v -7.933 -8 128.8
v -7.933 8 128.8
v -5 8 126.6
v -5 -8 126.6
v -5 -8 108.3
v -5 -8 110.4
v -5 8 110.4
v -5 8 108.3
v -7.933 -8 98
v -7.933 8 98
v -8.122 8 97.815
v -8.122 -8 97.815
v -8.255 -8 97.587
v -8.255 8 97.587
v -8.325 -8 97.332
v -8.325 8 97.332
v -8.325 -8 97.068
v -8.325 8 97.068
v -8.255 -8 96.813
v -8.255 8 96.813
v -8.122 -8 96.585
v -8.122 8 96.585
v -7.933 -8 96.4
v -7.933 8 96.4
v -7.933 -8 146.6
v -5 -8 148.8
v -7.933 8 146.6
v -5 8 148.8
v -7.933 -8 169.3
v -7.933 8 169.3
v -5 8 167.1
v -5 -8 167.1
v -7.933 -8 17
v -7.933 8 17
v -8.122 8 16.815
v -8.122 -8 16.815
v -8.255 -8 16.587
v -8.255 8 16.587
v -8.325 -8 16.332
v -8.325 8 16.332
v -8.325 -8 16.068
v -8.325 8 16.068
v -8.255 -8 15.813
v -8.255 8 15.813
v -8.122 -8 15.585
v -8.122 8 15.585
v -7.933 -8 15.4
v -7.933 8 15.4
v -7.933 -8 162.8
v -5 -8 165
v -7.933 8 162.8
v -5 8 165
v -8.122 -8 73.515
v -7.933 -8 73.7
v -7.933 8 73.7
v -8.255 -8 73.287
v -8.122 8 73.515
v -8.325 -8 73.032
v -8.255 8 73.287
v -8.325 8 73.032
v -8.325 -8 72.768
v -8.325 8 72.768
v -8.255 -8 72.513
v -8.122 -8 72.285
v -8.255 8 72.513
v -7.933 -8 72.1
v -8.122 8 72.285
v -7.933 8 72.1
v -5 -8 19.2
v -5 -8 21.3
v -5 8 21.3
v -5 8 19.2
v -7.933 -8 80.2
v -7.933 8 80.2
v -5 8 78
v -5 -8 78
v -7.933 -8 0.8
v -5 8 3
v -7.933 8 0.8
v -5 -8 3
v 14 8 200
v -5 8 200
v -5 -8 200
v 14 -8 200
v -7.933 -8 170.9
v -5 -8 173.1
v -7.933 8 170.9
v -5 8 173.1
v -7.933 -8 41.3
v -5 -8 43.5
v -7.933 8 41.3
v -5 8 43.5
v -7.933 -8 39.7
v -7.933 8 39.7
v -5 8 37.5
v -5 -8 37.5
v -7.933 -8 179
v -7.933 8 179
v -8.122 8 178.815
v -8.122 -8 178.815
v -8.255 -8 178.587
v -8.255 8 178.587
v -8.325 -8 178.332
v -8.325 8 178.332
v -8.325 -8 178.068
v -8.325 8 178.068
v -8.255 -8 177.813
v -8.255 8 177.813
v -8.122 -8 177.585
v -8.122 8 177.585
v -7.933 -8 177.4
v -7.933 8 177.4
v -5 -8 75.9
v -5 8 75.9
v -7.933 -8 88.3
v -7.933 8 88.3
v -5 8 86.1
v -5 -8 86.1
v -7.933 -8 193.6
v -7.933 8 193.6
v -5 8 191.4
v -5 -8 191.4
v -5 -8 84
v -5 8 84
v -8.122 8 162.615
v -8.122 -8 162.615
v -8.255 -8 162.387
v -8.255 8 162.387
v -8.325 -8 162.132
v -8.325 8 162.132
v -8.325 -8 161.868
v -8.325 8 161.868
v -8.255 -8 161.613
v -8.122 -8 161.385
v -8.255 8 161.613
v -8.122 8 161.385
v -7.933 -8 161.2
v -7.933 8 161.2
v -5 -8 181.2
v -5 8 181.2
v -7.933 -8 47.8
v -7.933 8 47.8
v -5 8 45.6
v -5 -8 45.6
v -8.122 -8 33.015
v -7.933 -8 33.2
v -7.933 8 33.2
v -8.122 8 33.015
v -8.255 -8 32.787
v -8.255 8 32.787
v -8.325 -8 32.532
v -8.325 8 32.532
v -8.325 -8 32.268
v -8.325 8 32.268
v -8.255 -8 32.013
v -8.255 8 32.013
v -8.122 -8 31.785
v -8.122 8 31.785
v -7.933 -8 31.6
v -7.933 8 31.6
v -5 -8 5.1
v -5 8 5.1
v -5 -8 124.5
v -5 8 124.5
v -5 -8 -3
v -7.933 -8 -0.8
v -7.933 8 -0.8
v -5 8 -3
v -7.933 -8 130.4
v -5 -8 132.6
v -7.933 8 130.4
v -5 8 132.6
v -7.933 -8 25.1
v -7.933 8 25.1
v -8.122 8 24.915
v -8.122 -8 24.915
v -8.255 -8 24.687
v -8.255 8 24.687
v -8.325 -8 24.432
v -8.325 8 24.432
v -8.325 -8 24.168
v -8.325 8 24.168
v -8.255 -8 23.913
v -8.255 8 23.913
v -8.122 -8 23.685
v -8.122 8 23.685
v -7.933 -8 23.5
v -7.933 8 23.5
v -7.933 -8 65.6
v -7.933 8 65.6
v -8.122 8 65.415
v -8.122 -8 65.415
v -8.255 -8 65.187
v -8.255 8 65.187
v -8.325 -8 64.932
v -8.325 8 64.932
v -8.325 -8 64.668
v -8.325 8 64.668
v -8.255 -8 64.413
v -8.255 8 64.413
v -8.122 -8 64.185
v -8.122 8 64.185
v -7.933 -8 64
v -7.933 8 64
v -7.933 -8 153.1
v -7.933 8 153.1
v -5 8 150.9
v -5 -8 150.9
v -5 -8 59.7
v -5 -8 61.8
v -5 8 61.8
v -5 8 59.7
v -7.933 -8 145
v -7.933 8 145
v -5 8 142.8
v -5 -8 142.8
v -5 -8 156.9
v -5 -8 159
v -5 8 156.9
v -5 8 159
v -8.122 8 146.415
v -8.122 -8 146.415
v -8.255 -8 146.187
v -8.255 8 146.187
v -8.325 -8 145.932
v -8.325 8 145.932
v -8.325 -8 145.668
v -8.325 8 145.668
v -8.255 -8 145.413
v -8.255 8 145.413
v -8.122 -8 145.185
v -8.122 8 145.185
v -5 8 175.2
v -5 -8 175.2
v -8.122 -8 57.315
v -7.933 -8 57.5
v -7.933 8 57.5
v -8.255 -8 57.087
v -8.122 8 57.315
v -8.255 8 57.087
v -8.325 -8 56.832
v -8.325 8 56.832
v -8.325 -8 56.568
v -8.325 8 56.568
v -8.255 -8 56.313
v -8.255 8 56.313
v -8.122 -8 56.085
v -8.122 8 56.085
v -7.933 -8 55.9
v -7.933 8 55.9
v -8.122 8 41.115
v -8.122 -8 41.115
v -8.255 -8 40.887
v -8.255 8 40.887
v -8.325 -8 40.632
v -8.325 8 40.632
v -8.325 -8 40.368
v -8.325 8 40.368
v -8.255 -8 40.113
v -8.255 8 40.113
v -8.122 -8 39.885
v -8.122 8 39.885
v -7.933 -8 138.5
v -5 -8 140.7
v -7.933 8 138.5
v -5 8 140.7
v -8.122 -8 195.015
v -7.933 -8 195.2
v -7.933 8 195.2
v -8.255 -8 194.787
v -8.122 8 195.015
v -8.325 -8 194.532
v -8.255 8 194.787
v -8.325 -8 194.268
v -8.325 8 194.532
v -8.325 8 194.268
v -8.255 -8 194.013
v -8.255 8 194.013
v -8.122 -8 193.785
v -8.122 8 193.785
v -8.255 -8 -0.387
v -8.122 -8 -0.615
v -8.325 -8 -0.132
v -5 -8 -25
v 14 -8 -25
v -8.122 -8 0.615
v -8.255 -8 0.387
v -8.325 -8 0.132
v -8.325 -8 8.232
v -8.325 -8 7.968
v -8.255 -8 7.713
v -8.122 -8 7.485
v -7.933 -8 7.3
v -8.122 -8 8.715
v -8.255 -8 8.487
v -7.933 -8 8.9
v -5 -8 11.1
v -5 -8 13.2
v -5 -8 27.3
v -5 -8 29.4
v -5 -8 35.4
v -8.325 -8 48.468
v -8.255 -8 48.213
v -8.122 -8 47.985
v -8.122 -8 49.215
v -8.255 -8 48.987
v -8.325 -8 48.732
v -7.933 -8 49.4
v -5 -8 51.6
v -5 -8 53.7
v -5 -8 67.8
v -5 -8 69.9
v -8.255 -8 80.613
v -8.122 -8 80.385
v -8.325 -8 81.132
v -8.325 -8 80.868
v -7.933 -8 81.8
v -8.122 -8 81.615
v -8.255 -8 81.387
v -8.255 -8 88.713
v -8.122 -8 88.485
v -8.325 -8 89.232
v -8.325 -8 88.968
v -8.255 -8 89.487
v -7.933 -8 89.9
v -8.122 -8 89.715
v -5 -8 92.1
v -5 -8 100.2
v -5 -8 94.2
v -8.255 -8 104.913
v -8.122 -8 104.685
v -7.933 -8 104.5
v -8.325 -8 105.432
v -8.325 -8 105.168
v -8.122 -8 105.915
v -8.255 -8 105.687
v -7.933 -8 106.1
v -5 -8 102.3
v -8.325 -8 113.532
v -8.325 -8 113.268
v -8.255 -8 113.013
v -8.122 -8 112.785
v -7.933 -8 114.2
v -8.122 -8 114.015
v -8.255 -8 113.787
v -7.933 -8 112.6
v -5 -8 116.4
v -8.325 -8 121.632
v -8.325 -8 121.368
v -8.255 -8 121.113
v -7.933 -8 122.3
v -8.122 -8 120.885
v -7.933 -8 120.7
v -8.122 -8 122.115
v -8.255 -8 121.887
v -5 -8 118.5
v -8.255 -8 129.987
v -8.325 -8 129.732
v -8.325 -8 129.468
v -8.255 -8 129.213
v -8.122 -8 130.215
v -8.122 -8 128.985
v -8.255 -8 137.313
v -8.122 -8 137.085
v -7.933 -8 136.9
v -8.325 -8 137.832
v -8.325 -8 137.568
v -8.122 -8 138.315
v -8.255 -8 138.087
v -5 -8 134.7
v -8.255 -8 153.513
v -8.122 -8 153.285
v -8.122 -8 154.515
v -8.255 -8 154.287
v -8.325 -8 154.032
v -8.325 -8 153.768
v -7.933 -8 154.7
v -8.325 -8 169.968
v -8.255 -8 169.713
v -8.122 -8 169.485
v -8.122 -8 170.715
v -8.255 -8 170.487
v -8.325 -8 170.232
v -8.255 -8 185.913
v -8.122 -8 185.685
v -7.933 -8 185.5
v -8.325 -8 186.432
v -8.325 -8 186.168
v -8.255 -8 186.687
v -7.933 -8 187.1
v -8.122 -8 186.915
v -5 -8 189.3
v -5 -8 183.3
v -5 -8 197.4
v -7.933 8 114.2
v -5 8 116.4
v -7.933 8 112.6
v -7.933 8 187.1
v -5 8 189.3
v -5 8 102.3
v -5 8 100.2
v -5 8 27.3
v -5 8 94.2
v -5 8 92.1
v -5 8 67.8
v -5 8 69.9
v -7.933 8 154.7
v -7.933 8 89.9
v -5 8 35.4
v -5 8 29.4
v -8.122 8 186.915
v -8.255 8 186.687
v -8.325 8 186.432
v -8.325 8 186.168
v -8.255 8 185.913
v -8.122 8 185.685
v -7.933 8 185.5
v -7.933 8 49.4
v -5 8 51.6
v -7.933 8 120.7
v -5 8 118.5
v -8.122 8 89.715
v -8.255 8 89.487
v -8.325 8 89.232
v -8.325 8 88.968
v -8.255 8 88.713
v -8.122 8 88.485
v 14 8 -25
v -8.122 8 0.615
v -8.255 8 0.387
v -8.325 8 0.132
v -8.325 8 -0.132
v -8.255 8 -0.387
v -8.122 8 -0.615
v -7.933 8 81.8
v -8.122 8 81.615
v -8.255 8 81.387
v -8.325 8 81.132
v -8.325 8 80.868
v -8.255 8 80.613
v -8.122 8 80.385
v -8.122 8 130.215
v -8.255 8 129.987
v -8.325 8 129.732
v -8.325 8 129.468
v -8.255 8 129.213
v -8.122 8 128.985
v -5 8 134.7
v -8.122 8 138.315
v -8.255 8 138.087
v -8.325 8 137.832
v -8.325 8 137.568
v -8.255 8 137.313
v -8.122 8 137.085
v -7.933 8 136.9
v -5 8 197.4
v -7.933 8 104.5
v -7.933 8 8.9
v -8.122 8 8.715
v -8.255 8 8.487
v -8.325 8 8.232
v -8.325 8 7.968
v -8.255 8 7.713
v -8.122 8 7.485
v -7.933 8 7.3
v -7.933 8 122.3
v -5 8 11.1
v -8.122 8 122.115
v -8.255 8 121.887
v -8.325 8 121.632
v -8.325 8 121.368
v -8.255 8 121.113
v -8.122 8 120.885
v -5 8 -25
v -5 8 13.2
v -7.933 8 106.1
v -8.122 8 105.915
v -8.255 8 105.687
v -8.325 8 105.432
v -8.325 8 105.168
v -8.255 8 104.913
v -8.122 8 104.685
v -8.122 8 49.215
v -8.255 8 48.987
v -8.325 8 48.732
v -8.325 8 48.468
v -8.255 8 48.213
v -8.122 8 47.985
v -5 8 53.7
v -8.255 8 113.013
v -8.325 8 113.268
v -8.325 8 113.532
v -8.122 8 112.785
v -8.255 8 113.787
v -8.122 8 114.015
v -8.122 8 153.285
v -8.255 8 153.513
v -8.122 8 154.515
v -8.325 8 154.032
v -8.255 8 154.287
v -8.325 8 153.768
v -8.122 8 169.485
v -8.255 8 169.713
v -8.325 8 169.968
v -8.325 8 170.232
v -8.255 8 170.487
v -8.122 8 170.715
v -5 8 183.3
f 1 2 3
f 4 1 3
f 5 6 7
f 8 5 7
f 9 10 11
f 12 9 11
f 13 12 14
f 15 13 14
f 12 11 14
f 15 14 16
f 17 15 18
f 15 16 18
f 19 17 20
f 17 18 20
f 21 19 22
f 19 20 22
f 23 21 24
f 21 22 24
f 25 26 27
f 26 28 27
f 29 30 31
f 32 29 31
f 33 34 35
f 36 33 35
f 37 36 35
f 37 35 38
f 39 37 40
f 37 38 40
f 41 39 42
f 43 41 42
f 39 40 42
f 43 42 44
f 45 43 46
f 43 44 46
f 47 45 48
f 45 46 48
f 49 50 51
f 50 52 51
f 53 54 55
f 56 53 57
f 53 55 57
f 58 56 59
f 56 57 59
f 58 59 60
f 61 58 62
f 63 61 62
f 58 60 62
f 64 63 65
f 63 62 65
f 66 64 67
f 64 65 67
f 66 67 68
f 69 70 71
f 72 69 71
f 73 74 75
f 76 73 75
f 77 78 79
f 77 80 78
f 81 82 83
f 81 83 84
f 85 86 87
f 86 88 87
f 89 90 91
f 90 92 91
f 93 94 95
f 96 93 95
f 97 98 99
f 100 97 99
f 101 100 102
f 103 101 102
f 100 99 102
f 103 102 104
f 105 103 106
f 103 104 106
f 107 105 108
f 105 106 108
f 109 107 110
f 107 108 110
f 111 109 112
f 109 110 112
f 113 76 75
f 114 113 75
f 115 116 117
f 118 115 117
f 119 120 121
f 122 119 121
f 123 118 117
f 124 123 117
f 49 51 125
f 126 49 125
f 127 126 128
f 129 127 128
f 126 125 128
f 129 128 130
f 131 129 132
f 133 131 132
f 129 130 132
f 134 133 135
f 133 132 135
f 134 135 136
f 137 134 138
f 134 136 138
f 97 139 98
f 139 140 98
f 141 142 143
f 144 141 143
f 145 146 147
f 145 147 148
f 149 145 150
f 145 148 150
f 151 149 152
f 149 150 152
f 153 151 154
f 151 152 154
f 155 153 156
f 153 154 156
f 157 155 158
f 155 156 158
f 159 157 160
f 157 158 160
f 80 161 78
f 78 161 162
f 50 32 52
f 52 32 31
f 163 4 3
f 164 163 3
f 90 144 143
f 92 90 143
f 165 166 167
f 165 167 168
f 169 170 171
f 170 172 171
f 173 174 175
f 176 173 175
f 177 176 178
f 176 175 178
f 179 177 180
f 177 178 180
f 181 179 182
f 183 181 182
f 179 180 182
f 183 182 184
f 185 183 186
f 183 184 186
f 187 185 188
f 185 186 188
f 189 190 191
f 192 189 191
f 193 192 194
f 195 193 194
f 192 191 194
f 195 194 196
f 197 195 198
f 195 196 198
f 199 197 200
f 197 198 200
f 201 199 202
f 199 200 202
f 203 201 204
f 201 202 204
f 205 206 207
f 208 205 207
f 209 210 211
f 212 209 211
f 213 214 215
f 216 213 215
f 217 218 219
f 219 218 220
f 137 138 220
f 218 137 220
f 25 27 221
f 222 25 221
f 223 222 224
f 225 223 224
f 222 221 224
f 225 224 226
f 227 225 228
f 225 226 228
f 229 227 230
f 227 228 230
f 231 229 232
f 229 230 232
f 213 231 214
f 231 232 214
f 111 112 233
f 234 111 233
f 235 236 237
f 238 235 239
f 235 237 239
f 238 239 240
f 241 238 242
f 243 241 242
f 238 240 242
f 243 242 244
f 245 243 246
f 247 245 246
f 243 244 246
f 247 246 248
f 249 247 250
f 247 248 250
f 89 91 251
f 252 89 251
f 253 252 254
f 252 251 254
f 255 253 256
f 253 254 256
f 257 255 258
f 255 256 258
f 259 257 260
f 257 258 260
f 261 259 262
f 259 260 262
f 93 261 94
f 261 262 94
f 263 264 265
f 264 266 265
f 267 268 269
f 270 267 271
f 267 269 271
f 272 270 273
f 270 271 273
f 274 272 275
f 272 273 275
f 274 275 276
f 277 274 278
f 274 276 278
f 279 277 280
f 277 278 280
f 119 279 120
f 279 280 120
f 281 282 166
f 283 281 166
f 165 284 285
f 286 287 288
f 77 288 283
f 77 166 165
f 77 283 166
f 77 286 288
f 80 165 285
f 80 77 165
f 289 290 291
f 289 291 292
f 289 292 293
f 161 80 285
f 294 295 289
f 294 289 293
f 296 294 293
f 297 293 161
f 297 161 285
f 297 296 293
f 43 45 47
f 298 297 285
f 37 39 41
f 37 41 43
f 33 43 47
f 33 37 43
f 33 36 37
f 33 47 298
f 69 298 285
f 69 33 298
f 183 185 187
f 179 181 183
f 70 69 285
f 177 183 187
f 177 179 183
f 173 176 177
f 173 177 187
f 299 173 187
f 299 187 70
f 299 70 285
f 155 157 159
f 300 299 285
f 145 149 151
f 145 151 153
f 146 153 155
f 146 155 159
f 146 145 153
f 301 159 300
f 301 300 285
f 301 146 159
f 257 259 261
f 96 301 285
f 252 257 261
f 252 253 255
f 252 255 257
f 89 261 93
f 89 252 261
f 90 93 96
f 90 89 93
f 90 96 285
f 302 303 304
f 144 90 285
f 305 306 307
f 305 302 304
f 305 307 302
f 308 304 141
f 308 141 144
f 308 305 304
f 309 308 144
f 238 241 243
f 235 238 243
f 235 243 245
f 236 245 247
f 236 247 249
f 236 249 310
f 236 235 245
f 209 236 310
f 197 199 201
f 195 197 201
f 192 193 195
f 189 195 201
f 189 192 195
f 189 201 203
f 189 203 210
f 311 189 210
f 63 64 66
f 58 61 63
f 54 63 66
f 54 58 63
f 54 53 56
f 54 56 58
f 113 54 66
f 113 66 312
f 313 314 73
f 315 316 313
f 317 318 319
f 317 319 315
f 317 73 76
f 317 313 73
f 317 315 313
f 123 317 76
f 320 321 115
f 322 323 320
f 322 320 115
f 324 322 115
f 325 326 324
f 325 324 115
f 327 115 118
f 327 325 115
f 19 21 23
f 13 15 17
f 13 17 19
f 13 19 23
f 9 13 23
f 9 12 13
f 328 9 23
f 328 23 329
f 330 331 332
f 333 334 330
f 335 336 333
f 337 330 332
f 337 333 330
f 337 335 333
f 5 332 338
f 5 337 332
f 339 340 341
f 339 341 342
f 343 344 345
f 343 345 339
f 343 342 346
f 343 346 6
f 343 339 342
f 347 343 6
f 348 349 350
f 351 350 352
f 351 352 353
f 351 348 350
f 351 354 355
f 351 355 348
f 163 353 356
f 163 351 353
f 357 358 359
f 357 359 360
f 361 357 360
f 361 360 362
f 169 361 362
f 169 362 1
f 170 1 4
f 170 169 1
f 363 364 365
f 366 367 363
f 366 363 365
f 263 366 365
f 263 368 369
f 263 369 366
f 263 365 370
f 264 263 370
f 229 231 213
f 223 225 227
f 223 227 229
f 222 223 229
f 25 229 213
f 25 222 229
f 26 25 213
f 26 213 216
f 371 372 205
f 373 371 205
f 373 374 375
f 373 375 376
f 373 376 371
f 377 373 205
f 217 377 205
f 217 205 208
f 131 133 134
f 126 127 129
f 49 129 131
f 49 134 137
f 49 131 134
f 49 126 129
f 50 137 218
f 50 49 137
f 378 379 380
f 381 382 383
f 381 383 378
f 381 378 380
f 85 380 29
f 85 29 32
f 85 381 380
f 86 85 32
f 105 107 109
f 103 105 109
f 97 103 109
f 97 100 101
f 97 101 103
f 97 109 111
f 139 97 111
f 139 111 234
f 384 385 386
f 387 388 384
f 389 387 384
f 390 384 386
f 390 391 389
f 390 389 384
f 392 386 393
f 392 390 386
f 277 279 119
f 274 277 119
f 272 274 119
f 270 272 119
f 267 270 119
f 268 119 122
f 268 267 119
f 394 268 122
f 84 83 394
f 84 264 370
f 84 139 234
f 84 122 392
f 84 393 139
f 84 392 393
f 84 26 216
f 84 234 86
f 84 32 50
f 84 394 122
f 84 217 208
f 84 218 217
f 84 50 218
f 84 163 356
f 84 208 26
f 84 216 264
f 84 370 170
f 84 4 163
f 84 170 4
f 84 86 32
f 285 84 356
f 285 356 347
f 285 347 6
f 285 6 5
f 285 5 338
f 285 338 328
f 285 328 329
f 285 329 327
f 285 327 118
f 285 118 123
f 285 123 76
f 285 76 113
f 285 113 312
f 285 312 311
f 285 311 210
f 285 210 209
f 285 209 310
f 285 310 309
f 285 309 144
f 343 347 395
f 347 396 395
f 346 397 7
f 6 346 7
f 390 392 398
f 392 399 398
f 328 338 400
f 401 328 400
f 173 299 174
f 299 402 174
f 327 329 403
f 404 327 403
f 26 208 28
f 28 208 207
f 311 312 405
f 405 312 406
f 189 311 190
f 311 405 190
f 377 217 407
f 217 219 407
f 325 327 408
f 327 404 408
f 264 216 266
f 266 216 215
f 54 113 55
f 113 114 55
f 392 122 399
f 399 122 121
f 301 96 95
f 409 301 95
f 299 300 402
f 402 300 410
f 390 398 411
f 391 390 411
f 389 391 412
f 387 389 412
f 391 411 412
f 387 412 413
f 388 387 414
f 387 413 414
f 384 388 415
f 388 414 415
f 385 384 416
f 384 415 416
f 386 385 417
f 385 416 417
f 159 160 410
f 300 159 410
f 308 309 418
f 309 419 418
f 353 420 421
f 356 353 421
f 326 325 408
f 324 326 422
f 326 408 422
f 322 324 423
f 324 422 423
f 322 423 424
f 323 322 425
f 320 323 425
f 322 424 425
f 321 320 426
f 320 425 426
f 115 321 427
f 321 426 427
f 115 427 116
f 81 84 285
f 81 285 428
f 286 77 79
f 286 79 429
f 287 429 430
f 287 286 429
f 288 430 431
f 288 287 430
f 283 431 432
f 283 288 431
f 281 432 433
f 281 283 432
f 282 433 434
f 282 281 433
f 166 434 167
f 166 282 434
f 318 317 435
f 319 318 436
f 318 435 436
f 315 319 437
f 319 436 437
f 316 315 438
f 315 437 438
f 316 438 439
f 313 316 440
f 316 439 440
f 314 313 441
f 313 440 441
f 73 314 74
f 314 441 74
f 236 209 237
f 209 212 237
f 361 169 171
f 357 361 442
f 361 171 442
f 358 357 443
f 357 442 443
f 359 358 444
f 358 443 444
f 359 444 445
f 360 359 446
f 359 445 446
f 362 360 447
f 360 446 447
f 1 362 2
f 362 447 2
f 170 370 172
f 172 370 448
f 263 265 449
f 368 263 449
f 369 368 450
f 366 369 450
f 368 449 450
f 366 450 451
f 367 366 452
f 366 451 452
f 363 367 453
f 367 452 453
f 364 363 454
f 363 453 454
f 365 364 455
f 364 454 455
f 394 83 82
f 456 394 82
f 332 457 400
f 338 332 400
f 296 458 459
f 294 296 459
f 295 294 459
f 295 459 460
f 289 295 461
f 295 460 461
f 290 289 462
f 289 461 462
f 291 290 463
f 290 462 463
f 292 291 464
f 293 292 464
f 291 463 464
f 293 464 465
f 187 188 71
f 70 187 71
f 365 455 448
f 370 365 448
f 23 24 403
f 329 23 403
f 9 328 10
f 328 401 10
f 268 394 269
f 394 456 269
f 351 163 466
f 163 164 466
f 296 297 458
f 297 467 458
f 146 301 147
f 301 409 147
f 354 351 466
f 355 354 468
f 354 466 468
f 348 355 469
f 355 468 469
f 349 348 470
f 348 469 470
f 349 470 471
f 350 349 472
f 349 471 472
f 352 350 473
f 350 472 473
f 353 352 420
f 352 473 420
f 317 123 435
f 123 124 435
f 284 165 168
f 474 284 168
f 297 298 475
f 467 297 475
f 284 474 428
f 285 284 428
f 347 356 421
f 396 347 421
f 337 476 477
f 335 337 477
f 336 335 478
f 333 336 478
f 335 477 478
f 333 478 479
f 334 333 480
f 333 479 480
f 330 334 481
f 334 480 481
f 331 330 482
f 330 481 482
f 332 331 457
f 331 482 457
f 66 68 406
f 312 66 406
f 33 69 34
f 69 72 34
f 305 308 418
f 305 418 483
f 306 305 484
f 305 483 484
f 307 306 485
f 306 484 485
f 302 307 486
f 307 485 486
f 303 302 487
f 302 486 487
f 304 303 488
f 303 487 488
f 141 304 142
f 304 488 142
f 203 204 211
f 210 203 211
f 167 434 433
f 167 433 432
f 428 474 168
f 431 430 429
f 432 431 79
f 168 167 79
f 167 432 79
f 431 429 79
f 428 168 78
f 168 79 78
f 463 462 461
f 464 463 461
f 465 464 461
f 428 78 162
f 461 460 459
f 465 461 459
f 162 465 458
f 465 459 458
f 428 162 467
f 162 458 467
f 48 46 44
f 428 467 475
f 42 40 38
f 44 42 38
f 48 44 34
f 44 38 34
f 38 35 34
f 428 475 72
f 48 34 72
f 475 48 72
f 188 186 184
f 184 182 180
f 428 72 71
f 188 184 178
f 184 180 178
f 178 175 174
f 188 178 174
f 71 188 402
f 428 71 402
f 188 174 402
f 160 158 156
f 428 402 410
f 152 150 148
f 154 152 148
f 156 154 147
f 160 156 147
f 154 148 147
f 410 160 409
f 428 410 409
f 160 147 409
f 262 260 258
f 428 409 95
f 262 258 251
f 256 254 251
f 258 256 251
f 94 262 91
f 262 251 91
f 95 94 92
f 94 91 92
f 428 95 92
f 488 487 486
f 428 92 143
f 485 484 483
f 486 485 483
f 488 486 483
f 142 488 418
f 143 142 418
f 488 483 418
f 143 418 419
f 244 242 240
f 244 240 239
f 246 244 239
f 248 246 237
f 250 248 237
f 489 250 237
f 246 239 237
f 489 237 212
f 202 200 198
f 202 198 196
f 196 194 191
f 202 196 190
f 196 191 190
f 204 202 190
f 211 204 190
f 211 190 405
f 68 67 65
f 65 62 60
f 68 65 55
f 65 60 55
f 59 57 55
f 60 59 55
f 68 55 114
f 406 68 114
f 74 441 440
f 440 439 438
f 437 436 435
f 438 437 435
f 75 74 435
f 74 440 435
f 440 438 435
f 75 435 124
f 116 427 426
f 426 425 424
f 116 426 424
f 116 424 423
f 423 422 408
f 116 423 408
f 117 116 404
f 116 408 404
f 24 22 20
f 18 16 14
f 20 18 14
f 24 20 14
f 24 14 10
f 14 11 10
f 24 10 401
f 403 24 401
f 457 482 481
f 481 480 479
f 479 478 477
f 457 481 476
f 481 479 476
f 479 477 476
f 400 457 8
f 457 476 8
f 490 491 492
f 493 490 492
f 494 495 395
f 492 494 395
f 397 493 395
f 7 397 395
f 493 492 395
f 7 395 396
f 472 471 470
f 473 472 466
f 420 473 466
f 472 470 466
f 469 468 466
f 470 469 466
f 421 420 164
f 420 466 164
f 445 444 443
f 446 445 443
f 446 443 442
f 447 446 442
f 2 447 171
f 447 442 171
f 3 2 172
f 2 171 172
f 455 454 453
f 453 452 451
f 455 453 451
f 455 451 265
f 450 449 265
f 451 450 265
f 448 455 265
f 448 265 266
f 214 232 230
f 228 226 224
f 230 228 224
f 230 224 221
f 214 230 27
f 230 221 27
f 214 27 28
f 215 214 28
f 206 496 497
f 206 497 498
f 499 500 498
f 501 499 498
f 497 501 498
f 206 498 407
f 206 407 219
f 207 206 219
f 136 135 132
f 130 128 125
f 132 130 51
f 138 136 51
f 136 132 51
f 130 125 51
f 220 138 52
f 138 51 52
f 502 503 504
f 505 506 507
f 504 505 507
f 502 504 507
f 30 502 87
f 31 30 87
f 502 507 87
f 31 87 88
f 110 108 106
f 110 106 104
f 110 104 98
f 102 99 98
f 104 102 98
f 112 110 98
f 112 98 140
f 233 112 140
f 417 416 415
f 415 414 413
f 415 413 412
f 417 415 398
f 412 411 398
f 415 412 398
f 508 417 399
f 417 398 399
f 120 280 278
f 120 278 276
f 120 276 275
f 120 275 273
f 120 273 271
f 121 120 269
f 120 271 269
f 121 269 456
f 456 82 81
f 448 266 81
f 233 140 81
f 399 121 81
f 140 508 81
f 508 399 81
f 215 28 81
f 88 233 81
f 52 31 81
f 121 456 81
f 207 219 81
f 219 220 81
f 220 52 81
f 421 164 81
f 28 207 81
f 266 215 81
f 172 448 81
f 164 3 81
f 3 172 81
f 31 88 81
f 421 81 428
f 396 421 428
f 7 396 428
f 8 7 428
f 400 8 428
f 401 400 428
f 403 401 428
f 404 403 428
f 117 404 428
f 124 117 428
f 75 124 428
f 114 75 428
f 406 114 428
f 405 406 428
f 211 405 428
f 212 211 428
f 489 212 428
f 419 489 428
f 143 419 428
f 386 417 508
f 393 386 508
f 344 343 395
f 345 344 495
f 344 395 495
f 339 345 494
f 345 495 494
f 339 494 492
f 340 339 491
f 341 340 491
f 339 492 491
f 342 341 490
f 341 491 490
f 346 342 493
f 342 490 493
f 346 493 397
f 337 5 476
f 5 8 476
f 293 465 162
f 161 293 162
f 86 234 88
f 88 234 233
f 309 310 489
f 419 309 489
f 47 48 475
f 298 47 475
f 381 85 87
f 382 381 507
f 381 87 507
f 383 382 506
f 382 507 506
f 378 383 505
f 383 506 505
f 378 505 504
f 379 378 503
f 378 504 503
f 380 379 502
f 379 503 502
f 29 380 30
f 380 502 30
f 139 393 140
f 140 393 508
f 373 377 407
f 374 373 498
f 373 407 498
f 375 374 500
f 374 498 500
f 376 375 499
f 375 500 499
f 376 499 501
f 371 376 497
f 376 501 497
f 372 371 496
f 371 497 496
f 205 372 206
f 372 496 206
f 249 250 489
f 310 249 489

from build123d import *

# Parameters (mm, degrees)
F0_W          = 19
F0_H          = 16
F1_DEPTH      = 200
F1_DEPTH_BACK = 25
F3_DEPTH      = 8


with BuildPart() as f1:
    # F0 (on Top) → F1 (new body, two sides)
    with BuildSketch(Plane.XY) as f1_sk:
        with Locations((4.5, 0)):
            Rectangle(F0_W, F0_H)
    extrude(amount=F1_DEPTH)
    extrude(f1_sk.sketch, amount=-F1_DEPTH_BACK)

    # F2 (on Front) → F3 (join, symmetric)
    with BuildSketch(Plane.XZ):
        with BuildLine():
            Line((-7.933333, 193.6), (-5, 191.4))
            Line((-5, 191.4), (-5, 197.4))
            Line((-5, 197.4), (-7.933333, 195.2))
            ThreePointArc((-7.933333, 195.2), (-8.333333, 194.4), (-7.933333, 193.6))
        make_face()
        with BuildLine():
            Line((-7.933333, 185.5), (-5, 183.3))
            Line((-5, 183.3), (-5, 189.3))
            Line((-5, 189.3), (-7.933333, 187.1))
            ThreePointArc((-7.933333, 187.1), (-8.333333, 186.3), (-7.933333, 185.5))
        make_face()
        with BuildLine():
            Line((-7.933333, 177.4), (-5, 175.2))
            Line((-5, 175.2), (-5, 181.2))
            Line((-5, 181.2), (-7.933333, 179))
            ThreePointArc((-7.933333, 179), (-8.333333, 178.2), (-7.933333, 177.4))
        make_face()
        with BuildLine():
            Line((-7.933333, 169.3), (-5, 167.1))
            Line((-5, 167.1), (-5, 173.1))
            Line((-5, 173.1), (-7.933333, 170.9))
            ThreePointArc((-7.933333, 170.9), (-8.333333, 170.1), (-7.933333, 169.3))
        make_face()
        with BuildLine():
            Line((-7.933333, 161.2), (-5, 159))
            Line((-5, 159), (-5, 165))
            Line((-5, 165), (-7.933333, 162.8))
            ThreePointArc((-7.933333, 162.8), (-8.333333, 162), (-7.933333, 161.2))
        make_face()
        with BuildLine():
            Line((-7.933333, 153.1), (-5, 150.9))
            Line((-5, 150.9), (-5, 156.9))
            Line((-5, 156.9), (-7.933333, 154.7))
            ThreePointArc((-7.933333, 154.7), (-8.333333, 153.9), (-7.933333, 153.1))
        make_face()
        with BuildLine():
            Line((-7.933333, 145), (-5, 142.8))
            Line((-5, 142.8), (-5, 148.8))
            Line((-5, 148.8), (-7.933333, 146.6))
            ThreePointArc((-7.933333, 146.6), (-8.333333, 145.8), (-7.933333, 145))
        make_face()
        with BuildLine():
            Line((-7.933333, 136.9), (-5, 134.7))
            Line((-5, 134.7), (-5, 140.7))
            Line((-5, 140.7), (-7.933333, 138.5))
            ThreePointArc((-7.933333, 138.5), (-8.333333, 137.7), (-7.933333, 136.9))
        make_face()
        with BuildLine():
            Line((-7.933333, 128.8), (-5, 126.6))
            Line((-5, 126.6), (-5, 132.6))
            Line((-5, 132.6), (-7.933333, 130.4))
            ThreePointArc((-7.933333, 130.4), (-8.333333, 129.6), (-7.933333, 128.8))
        make_face()
        with BuildLine():
            Line((-7.933333, 120.7), (-5, 118.5))
            Line((-5, 118.5), (-5, 124.5))
            Line((-5, 124.5), (-7.933333, 122.3))
            ThreePointArc((-7.933333, 122.3), (-8.333333, 121.5), (-7.933333, 120.7))
        make_face()
        with BuildLine():
            Line((-7.933333, 112.6), (-5, 110.4))
            Line((-5, 110.4), (-5, 116.4))
            Line((-5, 116.4), (-7.933333, 114.2))
            ThreePointArc((-7.933333, 114.2), (-8.333333, 113.4), (-7.933333, 112.6))
        make_face()
        with BuildLine():
            Line((-7.933333, 104.5), (-5, 102.3))
            Line((-5, 102.3), (-5, 108.3))
            Line((-5, 108.3), (-7.933333, 106.1))
            ThreePointArc((-7.933333, 106.1), (-8.333333, 105.3), (-7.933333, 104.5))
        make_face()
        with BuildLine():
            Line((-7.933333, 96.4), (-5, 94.2))
            Line((-5, 94.2), (-5, 100.2))
            Line((-5, 100.2), (-7.933333, 98))
            ThreePointArc((-7.933333, 98), (-8.333333, 97.2), (-7.933333, 96.4))
        make_face()
        with BuildLine():
            Line((-7.933333, 88.3), (-5, 86.1))
            Line((-5, 86.1), (-5, 92.1))
            Line((-5, 92.1), (-7.933333, 89.9))
            ThreePointArc((-7.933333, 89.9), (-8.333333, 89.1), (-7.933333, 88.3))
        make_face()
        with BuildLine():
            Line((-7.933333, 80.2), (-5, 78))
            Line((-5, 78), (-5, 84))
            Line((-5, 84), (-7.933333, 81.8))
            ThreePointArc((-7.933333, 81.8), (-8.333333, 81), (-7.933333, 80.2))
        make_face()
        with BuildLine():
            Line((-7.933333, 72.1), (-5, 69.9))
            Line((-5, 69.9), (-5, 75.9))
            Line((-5, 75.9), (-7.933333, 73.7))
            ThreePointArc((-7.933333, 73.7), (-8.333333, 72.9), (-7.933333, 72.1))
        make_face()
        with BuildLine():
            Line((-7.933333, 64), (-5, 61.8))
            Line((-5, 61.8), (-5, 67.8))
            Line((-5, 67.8), (-7.933333, 65.6))
            ThreePointArc((-7.933333, 65.6), (-8.333333, 64.8), (-7.933333, 64))
        make_face()
        with BuildLine():
            Line((-7.933333, 55.9), (-5, 53.7))
            Line((-5, 53.7), (-5, 59.7))
            Line((-5, 59.7), (-7.933333, 57.5))
            ThreePointArc((-7.933333, 57.5), (-8.333333, 56.7), (-7.933333, 55.9))
        make_face()
        with BuildLine():
            Line((-7.933333, 47.8), (-5, 45.6))
            Line((-5, 45.6), (-5, 51.6))
            Line((-5, 51.6), (-7.933333, 49.4))
            ThreePointArc((-7.933333, 49.4), (-8.333333, 48.6), (-7.933333, 47.8))
        make_face()
        with BuildLine():
            Line((-7.933333, 39.7), (-5, 37.5))
            Line((-5, 37.5), (-5, 43.5))
            Line((-5, 43.5), (-7.933333, 41.3))
            ThreePointArc((-7.933333, 41.3), (-8.333333, 40.5), (-7.933333, 39.7))
        make_face()
        with BuildLine():
            Line((-7.933333, 31.6), (-5, 29.4))
            Line((-5, 29.4), (-5, 35.4))
            Line((-5, 35.4), (-7.933333, 33.2))
            ThreePointArc((-7.933333, 33.2), (-8.333333, 32.4), (-7.933333, 31.6))
        make_face()
        with BuildLine():
            Line((-7.933333, 23.5), (-5, 21.3))
            Line((-5, 21.3), (-5, 27.3))
            Line((-5, 27.3), (-7.933333, 25.1))
            ThreePointArc((-7.933333, 25.1), (-8.333333, 24.3), (-7.933333, 23.5))
        make_face()
        with BuildLine():
            Line((-7.933333, 15.4), (-5, 13.2))
            Line((-5, 13.2), (-5, 19.2))
            Line((-5, 19.2), (-7.933333, 17))
            ThreePointArc((-7.933333, 17), (-8.333333, 16.2), (-7.933333, 15.4))
        make_face()
        with BuildLine():
            Line((-7.933333, 7.3), (-5, 5.1))
            Line((-5, 5.1), (-5, 11.1))
            Line((-5, 11.1), (-7.933333, 8.9))
            ThreePointArc((-7.933333, 8.9), (-8.333333, 8.1), (-7.933333, 7.3))
        make_face()
        with BuildLine():
            Line((-5, 3), (-7.933333, 0.8))
            ThreePointArc((-7.933333, 0.8), (-8.333333, 0), (-7.933333, -0.8))
            Line((-7.933333, -0.8), (-5, -3))
            Line((-5, -3), (-5, 3))
        make_face()
    extrude(amount=F3_DEPTH, both=True)


solid = f1.part
